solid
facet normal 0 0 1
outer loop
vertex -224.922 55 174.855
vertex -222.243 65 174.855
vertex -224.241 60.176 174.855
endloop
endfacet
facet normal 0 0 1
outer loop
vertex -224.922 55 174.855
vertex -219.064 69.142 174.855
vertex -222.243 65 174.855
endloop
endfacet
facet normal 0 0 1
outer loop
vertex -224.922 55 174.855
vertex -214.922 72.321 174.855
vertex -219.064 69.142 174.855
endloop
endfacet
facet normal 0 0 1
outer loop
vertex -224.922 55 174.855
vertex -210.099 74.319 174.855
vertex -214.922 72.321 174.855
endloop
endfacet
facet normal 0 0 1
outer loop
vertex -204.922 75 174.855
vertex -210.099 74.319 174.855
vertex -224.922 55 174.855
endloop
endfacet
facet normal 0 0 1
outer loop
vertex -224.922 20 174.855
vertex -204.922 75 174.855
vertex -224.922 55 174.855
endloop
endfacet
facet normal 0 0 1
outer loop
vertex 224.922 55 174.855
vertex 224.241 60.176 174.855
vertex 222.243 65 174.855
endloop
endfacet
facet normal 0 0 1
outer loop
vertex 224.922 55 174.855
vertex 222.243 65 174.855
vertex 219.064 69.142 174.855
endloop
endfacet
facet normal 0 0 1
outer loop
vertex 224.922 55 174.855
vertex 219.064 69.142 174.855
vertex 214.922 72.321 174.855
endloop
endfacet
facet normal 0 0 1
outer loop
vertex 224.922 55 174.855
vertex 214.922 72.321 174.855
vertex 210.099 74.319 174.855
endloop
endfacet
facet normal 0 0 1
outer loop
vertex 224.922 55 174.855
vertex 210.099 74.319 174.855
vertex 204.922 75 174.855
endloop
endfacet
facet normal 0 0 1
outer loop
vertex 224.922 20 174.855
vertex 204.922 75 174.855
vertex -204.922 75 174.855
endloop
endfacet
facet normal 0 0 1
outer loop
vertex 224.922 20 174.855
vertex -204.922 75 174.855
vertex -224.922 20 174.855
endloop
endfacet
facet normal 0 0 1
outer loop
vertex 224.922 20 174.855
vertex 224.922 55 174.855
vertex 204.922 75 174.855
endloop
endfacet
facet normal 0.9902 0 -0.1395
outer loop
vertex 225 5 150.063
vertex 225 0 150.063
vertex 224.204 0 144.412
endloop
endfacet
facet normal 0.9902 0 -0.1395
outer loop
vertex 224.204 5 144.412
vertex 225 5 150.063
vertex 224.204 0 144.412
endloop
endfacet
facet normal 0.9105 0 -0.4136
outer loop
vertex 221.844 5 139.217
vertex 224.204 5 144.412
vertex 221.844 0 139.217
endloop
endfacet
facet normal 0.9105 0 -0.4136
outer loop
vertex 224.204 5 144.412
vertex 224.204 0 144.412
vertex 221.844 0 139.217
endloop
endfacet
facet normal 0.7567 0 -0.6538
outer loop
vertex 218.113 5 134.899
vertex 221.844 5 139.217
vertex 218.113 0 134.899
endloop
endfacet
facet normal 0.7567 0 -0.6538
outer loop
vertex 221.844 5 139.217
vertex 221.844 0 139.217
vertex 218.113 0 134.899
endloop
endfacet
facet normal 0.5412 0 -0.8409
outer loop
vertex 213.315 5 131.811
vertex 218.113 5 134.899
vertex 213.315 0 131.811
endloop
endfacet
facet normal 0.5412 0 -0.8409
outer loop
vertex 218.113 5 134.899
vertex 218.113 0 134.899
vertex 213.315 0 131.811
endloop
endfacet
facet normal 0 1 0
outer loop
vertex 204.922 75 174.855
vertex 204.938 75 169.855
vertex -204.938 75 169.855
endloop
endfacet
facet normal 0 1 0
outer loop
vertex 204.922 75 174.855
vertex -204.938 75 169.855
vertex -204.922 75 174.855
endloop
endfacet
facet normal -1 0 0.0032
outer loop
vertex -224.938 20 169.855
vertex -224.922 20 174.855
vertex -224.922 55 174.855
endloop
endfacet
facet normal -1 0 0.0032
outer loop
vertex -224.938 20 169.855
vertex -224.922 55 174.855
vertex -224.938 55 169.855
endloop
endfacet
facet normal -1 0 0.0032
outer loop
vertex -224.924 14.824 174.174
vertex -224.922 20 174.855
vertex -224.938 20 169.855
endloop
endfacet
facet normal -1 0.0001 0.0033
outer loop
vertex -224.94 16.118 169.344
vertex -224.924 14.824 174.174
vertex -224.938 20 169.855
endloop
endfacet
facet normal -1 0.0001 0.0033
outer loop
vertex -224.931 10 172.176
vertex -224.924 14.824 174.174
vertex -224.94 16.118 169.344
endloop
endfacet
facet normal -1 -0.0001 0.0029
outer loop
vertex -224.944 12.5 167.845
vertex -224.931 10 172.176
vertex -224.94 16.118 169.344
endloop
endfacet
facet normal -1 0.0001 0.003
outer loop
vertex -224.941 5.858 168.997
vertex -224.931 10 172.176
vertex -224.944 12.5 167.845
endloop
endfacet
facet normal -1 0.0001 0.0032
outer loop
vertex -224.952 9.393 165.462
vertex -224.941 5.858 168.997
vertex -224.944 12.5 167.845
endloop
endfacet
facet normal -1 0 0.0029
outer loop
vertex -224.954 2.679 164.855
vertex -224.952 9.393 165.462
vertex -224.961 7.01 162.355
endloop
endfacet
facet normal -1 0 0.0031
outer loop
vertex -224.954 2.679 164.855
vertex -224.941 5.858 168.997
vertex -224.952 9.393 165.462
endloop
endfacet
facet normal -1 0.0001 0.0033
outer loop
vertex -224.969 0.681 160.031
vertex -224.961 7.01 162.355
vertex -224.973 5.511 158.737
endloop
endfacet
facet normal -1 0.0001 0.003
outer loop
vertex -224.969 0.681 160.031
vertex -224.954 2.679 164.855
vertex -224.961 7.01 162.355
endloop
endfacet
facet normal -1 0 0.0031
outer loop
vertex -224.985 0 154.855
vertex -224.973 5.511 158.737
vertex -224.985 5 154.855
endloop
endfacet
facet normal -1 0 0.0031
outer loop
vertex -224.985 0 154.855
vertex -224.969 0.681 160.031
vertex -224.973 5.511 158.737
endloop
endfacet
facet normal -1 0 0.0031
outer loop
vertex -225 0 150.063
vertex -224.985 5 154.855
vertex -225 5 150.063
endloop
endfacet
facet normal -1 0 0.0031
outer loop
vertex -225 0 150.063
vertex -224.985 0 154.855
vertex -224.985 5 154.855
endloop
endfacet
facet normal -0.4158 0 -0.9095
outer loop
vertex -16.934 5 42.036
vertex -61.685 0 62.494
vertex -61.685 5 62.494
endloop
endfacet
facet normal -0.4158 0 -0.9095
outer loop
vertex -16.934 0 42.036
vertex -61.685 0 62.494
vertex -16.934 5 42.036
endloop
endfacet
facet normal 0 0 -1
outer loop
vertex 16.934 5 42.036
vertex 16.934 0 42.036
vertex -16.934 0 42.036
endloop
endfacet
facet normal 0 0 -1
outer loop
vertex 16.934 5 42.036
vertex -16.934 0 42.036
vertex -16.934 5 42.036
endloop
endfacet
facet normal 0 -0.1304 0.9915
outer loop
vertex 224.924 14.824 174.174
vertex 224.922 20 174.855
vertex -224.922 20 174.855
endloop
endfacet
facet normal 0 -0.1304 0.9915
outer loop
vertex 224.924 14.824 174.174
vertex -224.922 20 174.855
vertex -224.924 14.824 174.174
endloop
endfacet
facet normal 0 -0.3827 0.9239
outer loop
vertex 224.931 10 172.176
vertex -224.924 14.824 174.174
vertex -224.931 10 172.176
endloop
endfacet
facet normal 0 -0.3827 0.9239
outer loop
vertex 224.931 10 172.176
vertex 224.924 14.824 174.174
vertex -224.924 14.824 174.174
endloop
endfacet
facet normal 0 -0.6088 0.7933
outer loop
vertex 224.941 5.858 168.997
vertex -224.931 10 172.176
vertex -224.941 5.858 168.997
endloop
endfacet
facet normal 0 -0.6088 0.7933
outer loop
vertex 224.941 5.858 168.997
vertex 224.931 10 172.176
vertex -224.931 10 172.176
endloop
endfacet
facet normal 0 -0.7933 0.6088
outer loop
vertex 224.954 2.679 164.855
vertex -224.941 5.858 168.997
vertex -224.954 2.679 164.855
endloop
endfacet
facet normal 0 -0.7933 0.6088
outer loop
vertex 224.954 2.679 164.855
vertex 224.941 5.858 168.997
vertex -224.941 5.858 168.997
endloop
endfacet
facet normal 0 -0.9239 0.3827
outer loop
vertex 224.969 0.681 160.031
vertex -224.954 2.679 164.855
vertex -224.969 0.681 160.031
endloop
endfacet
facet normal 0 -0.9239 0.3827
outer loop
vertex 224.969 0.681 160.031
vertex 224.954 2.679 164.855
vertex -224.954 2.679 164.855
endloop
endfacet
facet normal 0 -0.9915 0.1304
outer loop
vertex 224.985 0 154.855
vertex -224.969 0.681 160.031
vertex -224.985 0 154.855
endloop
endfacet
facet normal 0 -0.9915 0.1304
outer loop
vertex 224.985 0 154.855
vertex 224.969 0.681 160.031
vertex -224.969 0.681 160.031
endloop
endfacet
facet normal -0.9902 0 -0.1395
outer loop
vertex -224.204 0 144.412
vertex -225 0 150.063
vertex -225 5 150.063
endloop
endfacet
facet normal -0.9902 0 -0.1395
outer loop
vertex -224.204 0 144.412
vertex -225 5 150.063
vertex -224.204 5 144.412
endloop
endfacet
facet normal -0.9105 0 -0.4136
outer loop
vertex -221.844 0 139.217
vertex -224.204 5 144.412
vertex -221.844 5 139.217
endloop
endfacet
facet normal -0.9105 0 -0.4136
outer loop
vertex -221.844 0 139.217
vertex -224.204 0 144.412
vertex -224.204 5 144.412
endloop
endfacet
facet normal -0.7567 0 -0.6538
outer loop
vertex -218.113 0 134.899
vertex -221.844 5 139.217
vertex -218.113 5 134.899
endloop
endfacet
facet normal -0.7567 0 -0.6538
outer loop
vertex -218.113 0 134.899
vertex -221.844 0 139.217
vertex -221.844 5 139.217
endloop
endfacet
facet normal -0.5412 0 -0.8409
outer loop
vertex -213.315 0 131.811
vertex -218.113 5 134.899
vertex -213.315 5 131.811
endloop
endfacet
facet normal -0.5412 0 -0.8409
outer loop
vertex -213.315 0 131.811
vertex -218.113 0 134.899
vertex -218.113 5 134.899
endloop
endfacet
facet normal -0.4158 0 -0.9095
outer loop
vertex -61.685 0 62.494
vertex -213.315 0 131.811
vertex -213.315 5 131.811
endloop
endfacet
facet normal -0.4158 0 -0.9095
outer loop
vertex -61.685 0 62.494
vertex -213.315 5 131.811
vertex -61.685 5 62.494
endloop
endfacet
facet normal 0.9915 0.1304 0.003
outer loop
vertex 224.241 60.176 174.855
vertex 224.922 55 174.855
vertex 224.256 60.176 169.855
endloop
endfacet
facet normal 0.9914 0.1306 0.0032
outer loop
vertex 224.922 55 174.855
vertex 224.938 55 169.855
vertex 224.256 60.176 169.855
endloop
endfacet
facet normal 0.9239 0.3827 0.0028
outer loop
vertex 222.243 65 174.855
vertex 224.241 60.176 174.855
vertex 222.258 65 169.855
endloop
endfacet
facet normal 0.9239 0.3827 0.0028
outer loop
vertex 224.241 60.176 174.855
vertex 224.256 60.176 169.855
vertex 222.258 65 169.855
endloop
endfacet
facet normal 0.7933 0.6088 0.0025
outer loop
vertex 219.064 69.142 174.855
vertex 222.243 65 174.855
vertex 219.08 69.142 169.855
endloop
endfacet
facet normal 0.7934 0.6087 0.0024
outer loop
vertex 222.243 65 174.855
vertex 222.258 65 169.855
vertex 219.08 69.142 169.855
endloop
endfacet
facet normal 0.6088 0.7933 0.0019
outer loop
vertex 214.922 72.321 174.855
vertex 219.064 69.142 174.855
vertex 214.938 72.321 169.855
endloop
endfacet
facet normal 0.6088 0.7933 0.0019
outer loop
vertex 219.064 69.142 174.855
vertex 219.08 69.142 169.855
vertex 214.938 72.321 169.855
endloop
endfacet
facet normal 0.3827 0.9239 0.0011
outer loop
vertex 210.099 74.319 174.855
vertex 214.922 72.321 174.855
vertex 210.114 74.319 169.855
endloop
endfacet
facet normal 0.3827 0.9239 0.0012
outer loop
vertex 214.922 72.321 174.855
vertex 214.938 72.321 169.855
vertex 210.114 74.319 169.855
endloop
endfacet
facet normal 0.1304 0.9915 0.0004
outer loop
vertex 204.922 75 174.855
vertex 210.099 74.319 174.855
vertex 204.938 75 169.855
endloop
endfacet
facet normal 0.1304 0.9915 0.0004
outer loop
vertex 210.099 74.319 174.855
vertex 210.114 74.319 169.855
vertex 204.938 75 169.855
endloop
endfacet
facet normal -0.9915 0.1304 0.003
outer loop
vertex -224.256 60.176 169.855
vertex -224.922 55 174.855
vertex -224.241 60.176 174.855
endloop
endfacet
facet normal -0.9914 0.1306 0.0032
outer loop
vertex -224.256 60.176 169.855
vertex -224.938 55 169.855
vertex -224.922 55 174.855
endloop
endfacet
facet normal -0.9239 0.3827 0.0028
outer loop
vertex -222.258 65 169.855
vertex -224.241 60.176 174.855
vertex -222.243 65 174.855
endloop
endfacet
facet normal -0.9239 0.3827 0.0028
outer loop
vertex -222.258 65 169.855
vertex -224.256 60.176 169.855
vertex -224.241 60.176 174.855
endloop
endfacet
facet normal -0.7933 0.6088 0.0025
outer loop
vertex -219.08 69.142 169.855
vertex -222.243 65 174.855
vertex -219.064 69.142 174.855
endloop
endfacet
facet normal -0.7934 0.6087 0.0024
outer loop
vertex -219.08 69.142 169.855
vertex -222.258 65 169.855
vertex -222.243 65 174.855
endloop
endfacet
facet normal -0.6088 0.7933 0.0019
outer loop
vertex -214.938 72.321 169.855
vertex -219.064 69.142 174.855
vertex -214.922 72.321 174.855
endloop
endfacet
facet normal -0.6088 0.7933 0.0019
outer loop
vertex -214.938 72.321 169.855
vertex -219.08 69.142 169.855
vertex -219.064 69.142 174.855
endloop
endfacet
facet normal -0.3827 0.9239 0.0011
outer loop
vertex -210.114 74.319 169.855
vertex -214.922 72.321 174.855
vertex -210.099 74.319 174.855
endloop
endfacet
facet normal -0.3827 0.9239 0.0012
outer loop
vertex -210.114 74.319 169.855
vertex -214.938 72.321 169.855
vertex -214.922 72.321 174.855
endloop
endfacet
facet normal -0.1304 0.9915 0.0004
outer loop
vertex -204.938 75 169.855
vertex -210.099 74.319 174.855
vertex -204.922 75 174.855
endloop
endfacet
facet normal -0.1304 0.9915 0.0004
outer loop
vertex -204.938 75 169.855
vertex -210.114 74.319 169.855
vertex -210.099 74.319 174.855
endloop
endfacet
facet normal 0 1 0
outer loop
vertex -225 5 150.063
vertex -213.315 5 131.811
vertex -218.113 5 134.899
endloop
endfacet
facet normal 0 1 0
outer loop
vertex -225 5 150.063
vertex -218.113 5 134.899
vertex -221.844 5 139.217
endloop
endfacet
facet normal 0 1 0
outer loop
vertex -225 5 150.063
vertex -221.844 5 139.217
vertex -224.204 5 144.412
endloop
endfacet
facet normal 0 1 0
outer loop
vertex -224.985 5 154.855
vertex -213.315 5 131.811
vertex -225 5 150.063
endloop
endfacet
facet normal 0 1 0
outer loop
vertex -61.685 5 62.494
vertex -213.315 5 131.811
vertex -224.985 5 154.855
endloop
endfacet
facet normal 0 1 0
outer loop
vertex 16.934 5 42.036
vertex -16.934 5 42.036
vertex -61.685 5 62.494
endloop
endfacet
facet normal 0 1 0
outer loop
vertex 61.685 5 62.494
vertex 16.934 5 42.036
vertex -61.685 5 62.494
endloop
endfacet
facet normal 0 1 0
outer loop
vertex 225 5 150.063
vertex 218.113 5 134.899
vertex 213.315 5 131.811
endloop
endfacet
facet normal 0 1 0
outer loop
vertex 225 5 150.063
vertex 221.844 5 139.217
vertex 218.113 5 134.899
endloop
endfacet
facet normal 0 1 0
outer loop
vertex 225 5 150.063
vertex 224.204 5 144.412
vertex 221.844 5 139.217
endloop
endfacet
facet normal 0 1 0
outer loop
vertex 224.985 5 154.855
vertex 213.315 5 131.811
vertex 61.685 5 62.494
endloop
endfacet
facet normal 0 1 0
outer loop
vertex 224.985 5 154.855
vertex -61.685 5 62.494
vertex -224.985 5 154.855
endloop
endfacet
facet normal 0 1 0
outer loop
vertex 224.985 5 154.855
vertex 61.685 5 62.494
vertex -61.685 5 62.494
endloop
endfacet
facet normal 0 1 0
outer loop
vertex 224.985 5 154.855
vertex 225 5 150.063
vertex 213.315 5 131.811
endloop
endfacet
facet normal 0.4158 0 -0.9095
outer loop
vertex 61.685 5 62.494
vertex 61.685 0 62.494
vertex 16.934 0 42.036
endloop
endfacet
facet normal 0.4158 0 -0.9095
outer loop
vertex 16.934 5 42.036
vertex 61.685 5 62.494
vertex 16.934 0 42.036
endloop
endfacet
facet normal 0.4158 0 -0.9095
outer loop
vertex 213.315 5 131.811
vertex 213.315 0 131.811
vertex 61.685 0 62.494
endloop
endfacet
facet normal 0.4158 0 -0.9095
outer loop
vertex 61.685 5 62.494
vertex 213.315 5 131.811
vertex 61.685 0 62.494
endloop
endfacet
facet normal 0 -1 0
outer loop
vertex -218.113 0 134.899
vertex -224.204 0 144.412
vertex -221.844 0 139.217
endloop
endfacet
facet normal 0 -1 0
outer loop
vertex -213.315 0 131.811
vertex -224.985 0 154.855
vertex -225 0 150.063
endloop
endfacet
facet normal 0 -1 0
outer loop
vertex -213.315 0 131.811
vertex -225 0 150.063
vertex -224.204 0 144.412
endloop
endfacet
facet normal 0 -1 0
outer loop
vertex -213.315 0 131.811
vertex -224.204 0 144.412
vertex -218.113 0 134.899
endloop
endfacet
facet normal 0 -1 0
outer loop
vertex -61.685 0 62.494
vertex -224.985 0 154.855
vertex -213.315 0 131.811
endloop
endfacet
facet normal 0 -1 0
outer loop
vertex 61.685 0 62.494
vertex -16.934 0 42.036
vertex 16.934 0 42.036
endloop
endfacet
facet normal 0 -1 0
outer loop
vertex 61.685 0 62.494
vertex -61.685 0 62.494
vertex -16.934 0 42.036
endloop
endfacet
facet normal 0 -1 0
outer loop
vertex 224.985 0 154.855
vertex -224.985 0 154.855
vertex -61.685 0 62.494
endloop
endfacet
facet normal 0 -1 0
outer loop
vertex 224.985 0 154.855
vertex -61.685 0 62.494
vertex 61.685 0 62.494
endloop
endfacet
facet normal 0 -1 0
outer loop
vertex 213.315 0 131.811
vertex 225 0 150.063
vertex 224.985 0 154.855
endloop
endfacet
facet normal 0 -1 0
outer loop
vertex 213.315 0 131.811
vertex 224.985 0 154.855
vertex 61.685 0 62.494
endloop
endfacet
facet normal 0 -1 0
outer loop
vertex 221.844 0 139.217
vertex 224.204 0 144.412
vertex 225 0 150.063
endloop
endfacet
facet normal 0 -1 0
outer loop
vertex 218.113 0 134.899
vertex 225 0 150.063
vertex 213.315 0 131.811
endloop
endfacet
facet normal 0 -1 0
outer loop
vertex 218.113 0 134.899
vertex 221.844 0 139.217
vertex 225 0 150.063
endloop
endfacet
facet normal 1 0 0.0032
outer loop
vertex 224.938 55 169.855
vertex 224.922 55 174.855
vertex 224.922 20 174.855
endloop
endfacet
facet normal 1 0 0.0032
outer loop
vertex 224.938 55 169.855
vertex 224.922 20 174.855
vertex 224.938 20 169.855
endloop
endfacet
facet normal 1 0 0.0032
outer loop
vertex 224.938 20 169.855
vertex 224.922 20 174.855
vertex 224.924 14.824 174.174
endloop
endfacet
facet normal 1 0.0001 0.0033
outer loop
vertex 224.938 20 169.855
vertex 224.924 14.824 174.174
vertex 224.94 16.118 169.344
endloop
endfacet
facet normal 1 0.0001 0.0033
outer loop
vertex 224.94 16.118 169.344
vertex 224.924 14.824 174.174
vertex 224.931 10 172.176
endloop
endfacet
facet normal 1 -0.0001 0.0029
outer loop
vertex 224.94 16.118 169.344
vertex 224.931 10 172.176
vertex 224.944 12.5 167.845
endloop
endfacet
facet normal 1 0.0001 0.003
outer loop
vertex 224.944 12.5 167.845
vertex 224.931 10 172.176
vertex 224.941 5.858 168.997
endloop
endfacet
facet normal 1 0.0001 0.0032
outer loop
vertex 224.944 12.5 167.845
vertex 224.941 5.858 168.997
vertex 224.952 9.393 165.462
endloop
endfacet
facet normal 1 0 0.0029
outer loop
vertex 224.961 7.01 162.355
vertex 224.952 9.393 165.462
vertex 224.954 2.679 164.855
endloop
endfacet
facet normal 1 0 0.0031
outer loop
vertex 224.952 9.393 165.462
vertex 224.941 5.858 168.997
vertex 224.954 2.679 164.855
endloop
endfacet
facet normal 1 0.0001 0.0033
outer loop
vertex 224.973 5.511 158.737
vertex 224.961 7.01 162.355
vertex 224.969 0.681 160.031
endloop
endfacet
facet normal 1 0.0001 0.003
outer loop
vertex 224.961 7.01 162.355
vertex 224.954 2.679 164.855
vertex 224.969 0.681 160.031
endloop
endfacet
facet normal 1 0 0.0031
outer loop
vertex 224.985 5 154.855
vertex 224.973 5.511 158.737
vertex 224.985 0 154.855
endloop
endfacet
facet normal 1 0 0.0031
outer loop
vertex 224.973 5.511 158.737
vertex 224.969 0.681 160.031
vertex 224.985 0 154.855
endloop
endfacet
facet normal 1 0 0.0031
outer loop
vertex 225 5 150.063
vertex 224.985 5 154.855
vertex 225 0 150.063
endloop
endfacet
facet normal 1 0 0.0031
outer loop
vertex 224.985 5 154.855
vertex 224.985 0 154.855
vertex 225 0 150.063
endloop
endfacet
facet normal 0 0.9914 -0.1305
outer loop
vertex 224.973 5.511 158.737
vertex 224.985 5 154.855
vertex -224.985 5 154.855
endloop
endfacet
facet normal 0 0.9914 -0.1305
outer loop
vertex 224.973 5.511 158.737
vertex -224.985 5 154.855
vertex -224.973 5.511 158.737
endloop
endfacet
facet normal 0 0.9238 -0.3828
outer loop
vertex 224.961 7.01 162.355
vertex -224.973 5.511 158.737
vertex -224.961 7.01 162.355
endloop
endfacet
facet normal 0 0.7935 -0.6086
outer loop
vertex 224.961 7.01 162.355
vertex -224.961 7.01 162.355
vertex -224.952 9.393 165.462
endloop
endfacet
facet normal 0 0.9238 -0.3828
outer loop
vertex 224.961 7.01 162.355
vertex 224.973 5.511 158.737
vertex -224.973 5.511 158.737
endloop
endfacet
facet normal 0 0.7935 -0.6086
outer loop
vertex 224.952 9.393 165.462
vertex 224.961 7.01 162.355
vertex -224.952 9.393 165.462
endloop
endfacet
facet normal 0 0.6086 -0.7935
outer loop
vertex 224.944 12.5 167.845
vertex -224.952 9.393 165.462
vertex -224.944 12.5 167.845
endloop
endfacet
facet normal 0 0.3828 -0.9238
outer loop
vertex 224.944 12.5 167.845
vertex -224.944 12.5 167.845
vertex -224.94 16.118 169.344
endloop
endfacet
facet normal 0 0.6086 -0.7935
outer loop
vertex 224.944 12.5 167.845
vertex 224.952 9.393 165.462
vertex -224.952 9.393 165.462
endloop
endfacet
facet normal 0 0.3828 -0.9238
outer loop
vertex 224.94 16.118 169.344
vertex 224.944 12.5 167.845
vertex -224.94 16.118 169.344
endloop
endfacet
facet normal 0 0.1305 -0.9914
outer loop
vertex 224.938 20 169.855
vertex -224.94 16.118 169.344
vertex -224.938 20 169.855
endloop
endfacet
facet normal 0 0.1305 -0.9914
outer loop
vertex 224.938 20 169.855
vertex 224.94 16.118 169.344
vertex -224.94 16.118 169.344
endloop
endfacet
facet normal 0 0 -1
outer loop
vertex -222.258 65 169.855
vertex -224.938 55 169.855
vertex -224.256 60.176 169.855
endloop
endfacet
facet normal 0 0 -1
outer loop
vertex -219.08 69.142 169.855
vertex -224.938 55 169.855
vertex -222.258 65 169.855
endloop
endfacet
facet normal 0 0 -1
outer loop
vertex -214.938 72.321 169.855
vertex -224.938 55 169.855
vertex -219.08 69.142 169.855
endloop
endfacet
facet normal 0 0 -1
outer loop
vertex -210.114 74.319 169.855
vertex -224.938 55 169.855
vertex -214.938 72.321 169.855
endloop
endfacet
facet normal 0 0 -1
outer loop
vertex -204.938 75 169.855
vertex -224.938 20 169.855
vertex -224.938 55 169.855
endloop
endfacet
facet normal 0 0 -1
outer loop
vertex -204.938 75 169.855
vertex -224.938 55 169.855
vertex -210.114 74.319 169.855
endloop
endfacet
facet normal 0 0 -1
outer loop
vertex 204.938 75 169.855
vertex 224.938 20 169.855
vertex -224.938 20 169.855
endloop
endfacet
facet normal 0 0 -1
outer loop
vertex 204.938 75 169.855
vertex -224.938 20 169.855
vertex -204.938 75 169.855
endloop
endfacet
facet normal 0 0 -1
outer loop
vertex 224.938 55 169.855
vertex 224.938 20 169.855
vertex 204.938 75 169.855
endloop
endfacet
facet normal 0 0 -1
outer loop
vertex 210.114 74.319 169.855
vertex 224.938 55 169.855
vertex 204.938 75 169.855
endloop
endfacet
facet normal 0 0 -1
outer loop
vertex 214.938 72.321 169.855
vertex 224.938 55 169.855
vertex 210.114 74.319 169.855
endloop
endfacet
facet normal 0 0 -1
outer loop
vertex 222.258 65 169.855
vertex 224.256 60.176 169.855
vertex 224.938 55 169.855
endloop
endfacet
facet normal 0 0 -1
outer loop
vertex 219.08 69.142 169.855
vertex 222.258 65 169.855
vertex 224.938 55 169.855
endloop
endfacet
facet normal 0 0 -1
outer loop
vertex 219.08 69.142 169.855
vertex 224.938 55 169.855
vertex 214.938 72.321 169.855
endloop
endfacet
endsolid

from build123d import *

# Parameters (mm, degrees)
F2_DEPTH = 250
F3_DEPTH = 100
F4_R     = 20


with BuildPart() as f2:
    # F1 (on Right) → F2 (new body)
    with BuildSketch(Plane.YZ):
        with BuildLine():
            Line((0, 154.855098), (0, 42.036165))
            Line((0, 42.036165), (5, 42.036165))
            Line((5, 42.036165), (5, 154.855098))
            ThreePointArc((5, 154.855098), (9.393398, 165.4617), (20, 169.855098))
            Line((20, 169.855098), (75, 169.855098))
            Line((75, 169.855098), (75, 174.855098))
            Line((75, 174.855098), (20, 174.855098))
            ThreePointArc((20, 174.855098), (5.857864, 168.997234), (0, 154.855098))
        make_face()
    extrude(amount=F2_DEPTH)

    # F0 (on Front) → F3 (cut)
    with BuildSketch(Plane.XZ):
        with BuildLine():
            Line((291.145295, 178.066522), (224.921591, 175.062526))
            Line((224.921591, 175.062526), (224.999902, 150.062649))
            ThreePointArc((224.999902, 150.062649), (221.844029, 139.216741), (213.315195, 131.81051))
            Line((213.315195, 131.81051), (61.684805, 62.493761))
            Line((61.684805, 62.493761), (-75.020296, 0))
            Line((-75.020296, 0), (292.977542, 0))
            Line((292.977542, 0), (291.145295, 62.493761))
            Line((291.145295, 62.493761), (291.145295, 178.066522))
        make_face()
    extrude(amount=-F3_DEPTH, mode=Mode.SUBTRACT)

    # F4
    f4_edges = [f2.edges().sort_by_distance(p)[0] for p in [
        (224.930072, 75, 172.355098),
    ]]
    fillet(f4_edges, radius=F4_R)

    # F5: F2 across plane


with BuildPart() as f2_1:
    add(f2.part)
    add(f2.part.mirror(Plane.YZ))


solid = f2_1.part
